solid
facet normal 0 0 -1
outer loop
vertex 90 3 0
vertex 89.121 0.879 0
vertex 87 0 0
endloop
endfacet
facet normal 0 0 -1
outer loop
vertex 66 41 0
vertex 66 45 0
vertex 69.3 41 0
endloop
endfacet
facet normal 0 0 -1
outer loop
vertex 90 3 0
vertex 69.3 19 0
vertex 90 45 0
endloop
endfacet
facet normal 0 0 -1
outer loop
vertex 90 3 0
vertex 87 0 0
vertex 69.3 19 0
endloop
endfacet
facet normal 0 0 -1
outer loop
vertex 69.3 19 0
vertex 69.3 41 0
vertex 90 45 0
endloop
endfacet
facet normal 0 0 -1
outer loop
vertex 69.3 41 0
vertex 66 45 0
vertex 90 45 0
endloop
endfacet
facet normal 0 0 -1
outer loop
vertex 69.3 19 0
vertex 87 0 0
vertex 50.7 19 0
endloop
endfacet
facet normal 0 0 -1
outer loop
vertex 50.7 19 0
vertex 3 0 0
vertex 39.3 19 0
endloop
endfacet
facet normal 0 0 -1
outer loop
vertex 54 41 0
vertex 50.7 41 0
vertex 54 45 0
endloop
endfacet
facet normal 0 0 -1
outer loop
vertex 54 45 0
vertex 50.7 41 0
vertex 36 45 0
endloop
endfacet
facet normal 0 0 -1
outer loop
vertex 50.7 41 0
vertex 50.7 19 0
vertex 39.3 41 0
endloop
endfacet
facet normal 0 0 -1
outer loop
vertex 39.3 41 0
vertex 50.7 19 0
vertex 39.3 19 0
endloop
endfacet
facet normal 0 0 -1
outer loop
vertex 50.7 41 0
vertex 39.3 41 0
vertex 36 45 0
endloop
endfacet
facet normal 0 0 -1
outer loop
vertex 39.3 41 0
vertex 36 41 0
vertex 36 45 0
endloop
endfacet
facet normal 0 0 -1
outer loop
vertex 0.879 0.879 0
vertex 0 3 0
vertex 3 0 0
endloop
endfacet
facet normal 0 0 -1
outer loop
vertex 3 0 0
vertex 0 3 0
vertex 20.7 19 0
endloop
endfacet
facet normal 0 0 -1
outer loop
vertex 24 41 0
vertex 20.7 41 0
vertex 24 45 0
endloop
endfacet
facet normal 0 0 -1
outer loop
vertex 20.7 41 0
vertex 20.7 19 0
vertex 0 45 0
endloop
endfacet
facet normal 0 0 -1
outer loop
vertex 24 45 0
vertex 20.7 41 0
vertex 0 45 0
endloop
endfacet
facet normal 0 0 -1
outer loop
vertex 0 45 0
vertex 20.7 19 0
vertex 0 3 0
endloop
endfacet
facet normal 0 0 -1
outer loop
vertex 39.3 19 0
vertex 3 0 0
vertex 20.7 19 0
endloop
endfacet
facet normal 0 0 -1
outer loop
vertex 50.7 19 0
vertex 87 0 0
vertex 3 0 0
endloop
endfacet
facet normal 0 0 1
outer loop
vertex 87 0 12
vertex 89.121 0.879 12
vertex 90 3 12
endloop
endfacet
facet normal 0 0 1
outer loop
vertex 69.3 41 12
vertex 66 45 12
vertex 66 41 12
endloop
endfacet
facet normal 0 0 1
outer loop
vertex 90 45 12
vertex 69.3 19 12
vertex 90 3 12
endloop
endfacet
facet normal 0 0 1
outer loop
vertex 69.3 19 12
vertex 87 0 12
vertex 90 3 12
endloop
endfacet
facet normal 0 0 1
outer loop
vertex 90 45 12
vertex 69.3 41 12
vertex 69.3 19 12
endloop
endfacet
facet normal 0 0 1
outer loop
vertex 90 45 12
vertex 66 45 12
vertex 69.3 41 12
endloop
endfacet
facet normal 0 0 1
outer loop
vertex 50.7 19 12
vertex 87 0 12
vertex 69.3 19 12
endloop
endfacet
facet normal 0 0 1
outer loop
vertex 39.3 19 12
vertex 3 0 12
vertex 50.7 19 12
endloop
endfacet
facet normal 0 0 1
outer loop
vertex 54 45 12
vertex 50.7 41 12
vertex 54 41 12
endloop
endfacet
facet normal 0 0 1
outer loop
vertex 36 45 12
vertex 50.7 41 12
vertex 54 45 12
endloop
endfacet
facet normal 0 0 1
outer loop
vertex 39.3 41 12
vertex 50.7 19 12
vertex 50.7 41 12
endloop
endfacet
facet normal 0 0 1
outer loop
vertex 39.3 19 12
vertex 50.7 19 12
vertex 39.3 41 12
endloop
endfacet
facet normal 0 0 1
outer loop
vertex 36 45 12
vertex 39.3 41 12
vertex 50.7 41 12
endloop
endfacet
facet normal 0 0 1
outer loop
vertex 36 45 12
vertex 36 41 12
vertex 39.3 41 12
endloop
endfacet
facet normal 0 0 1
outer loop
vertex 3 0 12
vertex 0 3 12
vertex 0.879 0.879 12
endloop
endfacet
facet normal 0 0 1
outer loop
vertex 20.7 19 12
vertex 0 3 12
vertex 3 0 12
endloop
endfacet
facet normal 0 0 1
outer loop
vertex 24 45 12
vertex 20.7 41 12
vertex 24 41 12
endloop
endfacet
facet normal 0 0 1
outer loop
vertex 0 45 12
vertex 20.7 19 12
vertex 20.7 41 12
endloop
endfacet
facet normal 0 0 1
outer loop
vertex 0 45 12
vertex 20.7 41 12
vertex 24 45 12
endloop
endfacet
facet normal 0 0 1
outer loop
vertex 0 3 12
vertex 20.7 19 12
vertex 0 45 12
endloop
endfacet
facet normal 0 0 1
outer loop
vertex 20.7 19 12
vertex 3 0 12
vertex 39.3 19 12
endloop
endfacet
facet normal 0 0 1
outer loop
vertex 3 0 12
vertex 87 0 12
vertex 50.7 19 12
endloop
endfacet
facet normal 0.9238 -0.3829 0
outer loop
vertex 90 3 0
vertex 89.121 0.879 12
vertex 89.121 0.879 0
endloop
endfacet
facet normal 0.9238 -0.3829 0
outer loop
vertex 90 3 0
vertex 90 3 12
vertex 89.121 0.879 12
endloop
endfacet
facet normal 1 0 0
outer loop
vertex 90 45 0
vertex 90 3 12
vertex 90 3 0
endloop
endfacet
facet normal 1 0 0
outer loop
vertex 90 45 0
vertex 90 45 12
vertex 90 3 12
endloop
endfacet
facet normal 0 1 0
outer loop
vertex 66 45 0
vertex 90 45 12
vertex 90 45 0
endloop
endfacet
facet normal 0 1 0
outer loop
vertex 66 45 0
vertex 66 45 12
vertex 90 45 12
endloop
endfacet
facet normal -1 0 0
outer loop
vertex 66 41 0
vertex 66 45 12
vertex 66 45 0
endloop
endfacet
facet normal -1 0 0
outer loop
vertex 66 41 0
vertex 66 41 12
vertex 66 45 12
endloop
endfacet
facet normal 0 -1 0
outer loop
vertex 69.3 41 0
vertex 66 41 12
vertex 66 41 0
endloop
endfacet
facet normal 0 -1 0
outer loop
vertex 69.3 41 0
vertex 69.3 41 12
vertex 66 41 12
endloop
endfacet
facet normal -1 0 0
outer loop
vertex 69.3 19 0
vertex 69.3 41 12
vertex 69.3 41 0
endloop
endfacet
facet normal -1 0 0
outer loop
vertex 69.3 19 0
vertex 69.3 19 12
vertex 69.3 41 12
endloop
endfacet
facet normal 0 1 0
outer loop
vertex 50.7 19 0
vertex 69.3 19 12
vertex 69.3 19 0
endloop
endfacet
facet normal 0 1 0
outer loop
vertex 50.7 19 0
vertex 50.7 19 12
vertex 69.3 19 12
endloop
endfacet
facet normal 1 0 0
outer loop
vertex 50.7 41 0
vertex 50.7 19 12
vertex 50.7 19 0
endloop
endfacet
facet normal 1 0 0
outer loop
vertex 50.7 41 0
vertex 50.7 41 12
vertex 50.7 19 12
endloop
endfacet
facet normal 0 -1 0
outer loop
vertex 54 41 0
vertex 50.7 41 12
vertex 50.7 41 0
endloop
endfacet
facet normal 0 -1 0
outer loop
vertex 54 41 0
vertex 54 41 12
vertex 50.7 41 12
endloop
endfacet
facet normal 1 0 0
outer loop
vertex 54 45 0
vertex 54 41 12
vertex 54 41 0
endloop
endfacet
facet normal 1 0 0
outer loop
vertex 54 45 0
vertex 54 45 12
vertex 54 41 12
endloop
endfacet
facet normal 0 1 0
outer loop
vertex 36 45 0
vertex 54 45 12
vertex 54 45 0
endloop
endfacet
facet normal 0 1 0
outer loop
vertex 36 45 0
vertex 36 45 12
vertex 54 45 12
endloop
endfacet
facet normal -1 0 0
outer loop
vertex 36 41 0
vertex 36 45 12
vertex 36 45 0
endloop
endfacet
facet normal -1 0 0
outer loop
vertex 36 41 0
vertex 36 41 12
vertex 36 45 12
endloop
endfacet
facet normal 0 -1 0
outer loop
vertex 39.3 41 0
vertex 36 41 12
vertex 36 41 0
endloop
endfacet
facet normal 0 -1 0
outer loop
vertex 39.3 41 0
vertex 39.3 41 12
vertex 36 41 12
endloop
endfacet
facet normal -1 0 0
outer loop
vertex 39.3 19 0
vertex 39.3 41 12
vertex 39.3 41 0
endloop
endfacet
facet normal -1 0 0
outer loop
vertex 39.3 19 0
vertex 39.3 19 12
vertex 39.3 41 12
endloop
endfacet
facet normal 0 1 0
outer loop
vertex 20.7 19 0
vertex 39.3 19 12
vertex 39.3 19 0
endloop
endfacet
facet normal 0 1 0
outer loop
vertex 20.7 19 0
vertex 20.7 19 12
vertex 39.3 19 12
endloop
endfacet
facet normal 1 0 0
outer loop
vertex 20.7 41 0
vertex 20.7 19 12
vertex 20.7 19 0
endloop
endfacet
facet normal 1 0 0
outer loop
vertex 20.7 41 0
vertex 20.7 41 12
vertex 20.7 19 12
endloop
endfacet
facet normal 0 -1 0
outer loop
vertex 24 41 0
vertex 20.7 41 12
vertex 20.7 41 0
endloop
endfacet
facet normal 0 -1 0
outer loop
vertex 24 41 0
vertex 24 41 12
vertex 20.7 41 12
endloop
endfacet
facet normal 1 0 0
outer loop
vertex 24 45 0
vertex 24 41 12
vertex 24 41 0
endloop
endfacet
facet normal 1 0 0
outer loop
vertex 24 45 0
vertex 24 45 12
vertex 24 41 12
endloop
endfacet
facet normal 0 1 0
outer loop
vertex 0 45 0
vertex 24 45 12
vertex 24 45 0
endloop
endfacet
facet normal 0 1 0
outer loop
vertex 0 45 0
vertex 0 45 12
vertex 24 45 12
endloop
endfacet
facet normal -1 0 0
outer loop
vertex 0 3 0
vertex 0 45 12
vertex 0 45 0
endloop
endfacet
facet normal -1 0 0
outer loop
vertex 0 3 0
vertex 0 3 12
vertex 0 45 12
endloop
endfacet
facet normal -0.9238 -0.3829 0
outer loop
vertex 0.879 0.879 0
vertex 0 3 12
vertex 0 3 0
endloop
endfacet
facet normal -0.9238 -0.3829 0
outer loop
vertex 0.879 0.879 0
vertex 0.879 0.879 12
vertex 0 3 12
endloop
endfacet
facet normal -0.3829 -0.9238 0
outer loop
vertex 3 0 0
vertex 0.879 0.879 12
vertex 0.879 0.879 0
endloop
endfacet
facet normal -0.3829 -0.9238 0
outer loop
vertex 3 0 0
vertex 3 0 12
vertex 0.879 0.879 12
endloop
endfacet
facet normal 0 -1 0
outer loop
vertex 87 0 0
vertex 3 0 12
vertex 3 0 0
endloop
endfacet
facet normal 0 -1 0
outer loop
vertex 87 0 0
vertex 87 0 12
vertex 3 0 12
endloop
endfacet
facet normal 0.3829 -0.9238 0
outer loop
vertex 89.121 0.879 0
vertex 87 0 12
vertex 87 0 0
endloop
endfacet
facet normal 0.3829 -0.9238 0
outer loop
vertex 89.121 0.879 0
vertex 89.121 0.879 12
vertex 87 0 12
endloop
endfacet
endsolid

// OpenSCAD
$fn = 32;

// ----------------------------------------------------------------------
// Window plate: 90 x 45 mm, 2 open windows
// ----------------------------------------------------------------------

// --- parameters (mm) ---
profile_height = 12;      // extrusion height
profile_points = 24;      // points of the closed outline

profile = [[0, 3], [0.879, 0.879], [3, 0], [87, 0], [89.121, 0.879], [90, 3], [90, 45], [66, 45], [66, 41], [69.3, 41], [69.3, 19], [50.7, 19], [50.7, 41], [54, 41], [54, 45], [36, 45], [36, 41], [39.3, 41], [39.3, 19], [20.7, 19], [20.7, 41], [24, 41], [24, 45], [0, 45]];  // single closed polygon, 24 points, counter clockwise

// --- the one profile operation ---
linear_extrude(height = profile_height) polygon(points = profile);
